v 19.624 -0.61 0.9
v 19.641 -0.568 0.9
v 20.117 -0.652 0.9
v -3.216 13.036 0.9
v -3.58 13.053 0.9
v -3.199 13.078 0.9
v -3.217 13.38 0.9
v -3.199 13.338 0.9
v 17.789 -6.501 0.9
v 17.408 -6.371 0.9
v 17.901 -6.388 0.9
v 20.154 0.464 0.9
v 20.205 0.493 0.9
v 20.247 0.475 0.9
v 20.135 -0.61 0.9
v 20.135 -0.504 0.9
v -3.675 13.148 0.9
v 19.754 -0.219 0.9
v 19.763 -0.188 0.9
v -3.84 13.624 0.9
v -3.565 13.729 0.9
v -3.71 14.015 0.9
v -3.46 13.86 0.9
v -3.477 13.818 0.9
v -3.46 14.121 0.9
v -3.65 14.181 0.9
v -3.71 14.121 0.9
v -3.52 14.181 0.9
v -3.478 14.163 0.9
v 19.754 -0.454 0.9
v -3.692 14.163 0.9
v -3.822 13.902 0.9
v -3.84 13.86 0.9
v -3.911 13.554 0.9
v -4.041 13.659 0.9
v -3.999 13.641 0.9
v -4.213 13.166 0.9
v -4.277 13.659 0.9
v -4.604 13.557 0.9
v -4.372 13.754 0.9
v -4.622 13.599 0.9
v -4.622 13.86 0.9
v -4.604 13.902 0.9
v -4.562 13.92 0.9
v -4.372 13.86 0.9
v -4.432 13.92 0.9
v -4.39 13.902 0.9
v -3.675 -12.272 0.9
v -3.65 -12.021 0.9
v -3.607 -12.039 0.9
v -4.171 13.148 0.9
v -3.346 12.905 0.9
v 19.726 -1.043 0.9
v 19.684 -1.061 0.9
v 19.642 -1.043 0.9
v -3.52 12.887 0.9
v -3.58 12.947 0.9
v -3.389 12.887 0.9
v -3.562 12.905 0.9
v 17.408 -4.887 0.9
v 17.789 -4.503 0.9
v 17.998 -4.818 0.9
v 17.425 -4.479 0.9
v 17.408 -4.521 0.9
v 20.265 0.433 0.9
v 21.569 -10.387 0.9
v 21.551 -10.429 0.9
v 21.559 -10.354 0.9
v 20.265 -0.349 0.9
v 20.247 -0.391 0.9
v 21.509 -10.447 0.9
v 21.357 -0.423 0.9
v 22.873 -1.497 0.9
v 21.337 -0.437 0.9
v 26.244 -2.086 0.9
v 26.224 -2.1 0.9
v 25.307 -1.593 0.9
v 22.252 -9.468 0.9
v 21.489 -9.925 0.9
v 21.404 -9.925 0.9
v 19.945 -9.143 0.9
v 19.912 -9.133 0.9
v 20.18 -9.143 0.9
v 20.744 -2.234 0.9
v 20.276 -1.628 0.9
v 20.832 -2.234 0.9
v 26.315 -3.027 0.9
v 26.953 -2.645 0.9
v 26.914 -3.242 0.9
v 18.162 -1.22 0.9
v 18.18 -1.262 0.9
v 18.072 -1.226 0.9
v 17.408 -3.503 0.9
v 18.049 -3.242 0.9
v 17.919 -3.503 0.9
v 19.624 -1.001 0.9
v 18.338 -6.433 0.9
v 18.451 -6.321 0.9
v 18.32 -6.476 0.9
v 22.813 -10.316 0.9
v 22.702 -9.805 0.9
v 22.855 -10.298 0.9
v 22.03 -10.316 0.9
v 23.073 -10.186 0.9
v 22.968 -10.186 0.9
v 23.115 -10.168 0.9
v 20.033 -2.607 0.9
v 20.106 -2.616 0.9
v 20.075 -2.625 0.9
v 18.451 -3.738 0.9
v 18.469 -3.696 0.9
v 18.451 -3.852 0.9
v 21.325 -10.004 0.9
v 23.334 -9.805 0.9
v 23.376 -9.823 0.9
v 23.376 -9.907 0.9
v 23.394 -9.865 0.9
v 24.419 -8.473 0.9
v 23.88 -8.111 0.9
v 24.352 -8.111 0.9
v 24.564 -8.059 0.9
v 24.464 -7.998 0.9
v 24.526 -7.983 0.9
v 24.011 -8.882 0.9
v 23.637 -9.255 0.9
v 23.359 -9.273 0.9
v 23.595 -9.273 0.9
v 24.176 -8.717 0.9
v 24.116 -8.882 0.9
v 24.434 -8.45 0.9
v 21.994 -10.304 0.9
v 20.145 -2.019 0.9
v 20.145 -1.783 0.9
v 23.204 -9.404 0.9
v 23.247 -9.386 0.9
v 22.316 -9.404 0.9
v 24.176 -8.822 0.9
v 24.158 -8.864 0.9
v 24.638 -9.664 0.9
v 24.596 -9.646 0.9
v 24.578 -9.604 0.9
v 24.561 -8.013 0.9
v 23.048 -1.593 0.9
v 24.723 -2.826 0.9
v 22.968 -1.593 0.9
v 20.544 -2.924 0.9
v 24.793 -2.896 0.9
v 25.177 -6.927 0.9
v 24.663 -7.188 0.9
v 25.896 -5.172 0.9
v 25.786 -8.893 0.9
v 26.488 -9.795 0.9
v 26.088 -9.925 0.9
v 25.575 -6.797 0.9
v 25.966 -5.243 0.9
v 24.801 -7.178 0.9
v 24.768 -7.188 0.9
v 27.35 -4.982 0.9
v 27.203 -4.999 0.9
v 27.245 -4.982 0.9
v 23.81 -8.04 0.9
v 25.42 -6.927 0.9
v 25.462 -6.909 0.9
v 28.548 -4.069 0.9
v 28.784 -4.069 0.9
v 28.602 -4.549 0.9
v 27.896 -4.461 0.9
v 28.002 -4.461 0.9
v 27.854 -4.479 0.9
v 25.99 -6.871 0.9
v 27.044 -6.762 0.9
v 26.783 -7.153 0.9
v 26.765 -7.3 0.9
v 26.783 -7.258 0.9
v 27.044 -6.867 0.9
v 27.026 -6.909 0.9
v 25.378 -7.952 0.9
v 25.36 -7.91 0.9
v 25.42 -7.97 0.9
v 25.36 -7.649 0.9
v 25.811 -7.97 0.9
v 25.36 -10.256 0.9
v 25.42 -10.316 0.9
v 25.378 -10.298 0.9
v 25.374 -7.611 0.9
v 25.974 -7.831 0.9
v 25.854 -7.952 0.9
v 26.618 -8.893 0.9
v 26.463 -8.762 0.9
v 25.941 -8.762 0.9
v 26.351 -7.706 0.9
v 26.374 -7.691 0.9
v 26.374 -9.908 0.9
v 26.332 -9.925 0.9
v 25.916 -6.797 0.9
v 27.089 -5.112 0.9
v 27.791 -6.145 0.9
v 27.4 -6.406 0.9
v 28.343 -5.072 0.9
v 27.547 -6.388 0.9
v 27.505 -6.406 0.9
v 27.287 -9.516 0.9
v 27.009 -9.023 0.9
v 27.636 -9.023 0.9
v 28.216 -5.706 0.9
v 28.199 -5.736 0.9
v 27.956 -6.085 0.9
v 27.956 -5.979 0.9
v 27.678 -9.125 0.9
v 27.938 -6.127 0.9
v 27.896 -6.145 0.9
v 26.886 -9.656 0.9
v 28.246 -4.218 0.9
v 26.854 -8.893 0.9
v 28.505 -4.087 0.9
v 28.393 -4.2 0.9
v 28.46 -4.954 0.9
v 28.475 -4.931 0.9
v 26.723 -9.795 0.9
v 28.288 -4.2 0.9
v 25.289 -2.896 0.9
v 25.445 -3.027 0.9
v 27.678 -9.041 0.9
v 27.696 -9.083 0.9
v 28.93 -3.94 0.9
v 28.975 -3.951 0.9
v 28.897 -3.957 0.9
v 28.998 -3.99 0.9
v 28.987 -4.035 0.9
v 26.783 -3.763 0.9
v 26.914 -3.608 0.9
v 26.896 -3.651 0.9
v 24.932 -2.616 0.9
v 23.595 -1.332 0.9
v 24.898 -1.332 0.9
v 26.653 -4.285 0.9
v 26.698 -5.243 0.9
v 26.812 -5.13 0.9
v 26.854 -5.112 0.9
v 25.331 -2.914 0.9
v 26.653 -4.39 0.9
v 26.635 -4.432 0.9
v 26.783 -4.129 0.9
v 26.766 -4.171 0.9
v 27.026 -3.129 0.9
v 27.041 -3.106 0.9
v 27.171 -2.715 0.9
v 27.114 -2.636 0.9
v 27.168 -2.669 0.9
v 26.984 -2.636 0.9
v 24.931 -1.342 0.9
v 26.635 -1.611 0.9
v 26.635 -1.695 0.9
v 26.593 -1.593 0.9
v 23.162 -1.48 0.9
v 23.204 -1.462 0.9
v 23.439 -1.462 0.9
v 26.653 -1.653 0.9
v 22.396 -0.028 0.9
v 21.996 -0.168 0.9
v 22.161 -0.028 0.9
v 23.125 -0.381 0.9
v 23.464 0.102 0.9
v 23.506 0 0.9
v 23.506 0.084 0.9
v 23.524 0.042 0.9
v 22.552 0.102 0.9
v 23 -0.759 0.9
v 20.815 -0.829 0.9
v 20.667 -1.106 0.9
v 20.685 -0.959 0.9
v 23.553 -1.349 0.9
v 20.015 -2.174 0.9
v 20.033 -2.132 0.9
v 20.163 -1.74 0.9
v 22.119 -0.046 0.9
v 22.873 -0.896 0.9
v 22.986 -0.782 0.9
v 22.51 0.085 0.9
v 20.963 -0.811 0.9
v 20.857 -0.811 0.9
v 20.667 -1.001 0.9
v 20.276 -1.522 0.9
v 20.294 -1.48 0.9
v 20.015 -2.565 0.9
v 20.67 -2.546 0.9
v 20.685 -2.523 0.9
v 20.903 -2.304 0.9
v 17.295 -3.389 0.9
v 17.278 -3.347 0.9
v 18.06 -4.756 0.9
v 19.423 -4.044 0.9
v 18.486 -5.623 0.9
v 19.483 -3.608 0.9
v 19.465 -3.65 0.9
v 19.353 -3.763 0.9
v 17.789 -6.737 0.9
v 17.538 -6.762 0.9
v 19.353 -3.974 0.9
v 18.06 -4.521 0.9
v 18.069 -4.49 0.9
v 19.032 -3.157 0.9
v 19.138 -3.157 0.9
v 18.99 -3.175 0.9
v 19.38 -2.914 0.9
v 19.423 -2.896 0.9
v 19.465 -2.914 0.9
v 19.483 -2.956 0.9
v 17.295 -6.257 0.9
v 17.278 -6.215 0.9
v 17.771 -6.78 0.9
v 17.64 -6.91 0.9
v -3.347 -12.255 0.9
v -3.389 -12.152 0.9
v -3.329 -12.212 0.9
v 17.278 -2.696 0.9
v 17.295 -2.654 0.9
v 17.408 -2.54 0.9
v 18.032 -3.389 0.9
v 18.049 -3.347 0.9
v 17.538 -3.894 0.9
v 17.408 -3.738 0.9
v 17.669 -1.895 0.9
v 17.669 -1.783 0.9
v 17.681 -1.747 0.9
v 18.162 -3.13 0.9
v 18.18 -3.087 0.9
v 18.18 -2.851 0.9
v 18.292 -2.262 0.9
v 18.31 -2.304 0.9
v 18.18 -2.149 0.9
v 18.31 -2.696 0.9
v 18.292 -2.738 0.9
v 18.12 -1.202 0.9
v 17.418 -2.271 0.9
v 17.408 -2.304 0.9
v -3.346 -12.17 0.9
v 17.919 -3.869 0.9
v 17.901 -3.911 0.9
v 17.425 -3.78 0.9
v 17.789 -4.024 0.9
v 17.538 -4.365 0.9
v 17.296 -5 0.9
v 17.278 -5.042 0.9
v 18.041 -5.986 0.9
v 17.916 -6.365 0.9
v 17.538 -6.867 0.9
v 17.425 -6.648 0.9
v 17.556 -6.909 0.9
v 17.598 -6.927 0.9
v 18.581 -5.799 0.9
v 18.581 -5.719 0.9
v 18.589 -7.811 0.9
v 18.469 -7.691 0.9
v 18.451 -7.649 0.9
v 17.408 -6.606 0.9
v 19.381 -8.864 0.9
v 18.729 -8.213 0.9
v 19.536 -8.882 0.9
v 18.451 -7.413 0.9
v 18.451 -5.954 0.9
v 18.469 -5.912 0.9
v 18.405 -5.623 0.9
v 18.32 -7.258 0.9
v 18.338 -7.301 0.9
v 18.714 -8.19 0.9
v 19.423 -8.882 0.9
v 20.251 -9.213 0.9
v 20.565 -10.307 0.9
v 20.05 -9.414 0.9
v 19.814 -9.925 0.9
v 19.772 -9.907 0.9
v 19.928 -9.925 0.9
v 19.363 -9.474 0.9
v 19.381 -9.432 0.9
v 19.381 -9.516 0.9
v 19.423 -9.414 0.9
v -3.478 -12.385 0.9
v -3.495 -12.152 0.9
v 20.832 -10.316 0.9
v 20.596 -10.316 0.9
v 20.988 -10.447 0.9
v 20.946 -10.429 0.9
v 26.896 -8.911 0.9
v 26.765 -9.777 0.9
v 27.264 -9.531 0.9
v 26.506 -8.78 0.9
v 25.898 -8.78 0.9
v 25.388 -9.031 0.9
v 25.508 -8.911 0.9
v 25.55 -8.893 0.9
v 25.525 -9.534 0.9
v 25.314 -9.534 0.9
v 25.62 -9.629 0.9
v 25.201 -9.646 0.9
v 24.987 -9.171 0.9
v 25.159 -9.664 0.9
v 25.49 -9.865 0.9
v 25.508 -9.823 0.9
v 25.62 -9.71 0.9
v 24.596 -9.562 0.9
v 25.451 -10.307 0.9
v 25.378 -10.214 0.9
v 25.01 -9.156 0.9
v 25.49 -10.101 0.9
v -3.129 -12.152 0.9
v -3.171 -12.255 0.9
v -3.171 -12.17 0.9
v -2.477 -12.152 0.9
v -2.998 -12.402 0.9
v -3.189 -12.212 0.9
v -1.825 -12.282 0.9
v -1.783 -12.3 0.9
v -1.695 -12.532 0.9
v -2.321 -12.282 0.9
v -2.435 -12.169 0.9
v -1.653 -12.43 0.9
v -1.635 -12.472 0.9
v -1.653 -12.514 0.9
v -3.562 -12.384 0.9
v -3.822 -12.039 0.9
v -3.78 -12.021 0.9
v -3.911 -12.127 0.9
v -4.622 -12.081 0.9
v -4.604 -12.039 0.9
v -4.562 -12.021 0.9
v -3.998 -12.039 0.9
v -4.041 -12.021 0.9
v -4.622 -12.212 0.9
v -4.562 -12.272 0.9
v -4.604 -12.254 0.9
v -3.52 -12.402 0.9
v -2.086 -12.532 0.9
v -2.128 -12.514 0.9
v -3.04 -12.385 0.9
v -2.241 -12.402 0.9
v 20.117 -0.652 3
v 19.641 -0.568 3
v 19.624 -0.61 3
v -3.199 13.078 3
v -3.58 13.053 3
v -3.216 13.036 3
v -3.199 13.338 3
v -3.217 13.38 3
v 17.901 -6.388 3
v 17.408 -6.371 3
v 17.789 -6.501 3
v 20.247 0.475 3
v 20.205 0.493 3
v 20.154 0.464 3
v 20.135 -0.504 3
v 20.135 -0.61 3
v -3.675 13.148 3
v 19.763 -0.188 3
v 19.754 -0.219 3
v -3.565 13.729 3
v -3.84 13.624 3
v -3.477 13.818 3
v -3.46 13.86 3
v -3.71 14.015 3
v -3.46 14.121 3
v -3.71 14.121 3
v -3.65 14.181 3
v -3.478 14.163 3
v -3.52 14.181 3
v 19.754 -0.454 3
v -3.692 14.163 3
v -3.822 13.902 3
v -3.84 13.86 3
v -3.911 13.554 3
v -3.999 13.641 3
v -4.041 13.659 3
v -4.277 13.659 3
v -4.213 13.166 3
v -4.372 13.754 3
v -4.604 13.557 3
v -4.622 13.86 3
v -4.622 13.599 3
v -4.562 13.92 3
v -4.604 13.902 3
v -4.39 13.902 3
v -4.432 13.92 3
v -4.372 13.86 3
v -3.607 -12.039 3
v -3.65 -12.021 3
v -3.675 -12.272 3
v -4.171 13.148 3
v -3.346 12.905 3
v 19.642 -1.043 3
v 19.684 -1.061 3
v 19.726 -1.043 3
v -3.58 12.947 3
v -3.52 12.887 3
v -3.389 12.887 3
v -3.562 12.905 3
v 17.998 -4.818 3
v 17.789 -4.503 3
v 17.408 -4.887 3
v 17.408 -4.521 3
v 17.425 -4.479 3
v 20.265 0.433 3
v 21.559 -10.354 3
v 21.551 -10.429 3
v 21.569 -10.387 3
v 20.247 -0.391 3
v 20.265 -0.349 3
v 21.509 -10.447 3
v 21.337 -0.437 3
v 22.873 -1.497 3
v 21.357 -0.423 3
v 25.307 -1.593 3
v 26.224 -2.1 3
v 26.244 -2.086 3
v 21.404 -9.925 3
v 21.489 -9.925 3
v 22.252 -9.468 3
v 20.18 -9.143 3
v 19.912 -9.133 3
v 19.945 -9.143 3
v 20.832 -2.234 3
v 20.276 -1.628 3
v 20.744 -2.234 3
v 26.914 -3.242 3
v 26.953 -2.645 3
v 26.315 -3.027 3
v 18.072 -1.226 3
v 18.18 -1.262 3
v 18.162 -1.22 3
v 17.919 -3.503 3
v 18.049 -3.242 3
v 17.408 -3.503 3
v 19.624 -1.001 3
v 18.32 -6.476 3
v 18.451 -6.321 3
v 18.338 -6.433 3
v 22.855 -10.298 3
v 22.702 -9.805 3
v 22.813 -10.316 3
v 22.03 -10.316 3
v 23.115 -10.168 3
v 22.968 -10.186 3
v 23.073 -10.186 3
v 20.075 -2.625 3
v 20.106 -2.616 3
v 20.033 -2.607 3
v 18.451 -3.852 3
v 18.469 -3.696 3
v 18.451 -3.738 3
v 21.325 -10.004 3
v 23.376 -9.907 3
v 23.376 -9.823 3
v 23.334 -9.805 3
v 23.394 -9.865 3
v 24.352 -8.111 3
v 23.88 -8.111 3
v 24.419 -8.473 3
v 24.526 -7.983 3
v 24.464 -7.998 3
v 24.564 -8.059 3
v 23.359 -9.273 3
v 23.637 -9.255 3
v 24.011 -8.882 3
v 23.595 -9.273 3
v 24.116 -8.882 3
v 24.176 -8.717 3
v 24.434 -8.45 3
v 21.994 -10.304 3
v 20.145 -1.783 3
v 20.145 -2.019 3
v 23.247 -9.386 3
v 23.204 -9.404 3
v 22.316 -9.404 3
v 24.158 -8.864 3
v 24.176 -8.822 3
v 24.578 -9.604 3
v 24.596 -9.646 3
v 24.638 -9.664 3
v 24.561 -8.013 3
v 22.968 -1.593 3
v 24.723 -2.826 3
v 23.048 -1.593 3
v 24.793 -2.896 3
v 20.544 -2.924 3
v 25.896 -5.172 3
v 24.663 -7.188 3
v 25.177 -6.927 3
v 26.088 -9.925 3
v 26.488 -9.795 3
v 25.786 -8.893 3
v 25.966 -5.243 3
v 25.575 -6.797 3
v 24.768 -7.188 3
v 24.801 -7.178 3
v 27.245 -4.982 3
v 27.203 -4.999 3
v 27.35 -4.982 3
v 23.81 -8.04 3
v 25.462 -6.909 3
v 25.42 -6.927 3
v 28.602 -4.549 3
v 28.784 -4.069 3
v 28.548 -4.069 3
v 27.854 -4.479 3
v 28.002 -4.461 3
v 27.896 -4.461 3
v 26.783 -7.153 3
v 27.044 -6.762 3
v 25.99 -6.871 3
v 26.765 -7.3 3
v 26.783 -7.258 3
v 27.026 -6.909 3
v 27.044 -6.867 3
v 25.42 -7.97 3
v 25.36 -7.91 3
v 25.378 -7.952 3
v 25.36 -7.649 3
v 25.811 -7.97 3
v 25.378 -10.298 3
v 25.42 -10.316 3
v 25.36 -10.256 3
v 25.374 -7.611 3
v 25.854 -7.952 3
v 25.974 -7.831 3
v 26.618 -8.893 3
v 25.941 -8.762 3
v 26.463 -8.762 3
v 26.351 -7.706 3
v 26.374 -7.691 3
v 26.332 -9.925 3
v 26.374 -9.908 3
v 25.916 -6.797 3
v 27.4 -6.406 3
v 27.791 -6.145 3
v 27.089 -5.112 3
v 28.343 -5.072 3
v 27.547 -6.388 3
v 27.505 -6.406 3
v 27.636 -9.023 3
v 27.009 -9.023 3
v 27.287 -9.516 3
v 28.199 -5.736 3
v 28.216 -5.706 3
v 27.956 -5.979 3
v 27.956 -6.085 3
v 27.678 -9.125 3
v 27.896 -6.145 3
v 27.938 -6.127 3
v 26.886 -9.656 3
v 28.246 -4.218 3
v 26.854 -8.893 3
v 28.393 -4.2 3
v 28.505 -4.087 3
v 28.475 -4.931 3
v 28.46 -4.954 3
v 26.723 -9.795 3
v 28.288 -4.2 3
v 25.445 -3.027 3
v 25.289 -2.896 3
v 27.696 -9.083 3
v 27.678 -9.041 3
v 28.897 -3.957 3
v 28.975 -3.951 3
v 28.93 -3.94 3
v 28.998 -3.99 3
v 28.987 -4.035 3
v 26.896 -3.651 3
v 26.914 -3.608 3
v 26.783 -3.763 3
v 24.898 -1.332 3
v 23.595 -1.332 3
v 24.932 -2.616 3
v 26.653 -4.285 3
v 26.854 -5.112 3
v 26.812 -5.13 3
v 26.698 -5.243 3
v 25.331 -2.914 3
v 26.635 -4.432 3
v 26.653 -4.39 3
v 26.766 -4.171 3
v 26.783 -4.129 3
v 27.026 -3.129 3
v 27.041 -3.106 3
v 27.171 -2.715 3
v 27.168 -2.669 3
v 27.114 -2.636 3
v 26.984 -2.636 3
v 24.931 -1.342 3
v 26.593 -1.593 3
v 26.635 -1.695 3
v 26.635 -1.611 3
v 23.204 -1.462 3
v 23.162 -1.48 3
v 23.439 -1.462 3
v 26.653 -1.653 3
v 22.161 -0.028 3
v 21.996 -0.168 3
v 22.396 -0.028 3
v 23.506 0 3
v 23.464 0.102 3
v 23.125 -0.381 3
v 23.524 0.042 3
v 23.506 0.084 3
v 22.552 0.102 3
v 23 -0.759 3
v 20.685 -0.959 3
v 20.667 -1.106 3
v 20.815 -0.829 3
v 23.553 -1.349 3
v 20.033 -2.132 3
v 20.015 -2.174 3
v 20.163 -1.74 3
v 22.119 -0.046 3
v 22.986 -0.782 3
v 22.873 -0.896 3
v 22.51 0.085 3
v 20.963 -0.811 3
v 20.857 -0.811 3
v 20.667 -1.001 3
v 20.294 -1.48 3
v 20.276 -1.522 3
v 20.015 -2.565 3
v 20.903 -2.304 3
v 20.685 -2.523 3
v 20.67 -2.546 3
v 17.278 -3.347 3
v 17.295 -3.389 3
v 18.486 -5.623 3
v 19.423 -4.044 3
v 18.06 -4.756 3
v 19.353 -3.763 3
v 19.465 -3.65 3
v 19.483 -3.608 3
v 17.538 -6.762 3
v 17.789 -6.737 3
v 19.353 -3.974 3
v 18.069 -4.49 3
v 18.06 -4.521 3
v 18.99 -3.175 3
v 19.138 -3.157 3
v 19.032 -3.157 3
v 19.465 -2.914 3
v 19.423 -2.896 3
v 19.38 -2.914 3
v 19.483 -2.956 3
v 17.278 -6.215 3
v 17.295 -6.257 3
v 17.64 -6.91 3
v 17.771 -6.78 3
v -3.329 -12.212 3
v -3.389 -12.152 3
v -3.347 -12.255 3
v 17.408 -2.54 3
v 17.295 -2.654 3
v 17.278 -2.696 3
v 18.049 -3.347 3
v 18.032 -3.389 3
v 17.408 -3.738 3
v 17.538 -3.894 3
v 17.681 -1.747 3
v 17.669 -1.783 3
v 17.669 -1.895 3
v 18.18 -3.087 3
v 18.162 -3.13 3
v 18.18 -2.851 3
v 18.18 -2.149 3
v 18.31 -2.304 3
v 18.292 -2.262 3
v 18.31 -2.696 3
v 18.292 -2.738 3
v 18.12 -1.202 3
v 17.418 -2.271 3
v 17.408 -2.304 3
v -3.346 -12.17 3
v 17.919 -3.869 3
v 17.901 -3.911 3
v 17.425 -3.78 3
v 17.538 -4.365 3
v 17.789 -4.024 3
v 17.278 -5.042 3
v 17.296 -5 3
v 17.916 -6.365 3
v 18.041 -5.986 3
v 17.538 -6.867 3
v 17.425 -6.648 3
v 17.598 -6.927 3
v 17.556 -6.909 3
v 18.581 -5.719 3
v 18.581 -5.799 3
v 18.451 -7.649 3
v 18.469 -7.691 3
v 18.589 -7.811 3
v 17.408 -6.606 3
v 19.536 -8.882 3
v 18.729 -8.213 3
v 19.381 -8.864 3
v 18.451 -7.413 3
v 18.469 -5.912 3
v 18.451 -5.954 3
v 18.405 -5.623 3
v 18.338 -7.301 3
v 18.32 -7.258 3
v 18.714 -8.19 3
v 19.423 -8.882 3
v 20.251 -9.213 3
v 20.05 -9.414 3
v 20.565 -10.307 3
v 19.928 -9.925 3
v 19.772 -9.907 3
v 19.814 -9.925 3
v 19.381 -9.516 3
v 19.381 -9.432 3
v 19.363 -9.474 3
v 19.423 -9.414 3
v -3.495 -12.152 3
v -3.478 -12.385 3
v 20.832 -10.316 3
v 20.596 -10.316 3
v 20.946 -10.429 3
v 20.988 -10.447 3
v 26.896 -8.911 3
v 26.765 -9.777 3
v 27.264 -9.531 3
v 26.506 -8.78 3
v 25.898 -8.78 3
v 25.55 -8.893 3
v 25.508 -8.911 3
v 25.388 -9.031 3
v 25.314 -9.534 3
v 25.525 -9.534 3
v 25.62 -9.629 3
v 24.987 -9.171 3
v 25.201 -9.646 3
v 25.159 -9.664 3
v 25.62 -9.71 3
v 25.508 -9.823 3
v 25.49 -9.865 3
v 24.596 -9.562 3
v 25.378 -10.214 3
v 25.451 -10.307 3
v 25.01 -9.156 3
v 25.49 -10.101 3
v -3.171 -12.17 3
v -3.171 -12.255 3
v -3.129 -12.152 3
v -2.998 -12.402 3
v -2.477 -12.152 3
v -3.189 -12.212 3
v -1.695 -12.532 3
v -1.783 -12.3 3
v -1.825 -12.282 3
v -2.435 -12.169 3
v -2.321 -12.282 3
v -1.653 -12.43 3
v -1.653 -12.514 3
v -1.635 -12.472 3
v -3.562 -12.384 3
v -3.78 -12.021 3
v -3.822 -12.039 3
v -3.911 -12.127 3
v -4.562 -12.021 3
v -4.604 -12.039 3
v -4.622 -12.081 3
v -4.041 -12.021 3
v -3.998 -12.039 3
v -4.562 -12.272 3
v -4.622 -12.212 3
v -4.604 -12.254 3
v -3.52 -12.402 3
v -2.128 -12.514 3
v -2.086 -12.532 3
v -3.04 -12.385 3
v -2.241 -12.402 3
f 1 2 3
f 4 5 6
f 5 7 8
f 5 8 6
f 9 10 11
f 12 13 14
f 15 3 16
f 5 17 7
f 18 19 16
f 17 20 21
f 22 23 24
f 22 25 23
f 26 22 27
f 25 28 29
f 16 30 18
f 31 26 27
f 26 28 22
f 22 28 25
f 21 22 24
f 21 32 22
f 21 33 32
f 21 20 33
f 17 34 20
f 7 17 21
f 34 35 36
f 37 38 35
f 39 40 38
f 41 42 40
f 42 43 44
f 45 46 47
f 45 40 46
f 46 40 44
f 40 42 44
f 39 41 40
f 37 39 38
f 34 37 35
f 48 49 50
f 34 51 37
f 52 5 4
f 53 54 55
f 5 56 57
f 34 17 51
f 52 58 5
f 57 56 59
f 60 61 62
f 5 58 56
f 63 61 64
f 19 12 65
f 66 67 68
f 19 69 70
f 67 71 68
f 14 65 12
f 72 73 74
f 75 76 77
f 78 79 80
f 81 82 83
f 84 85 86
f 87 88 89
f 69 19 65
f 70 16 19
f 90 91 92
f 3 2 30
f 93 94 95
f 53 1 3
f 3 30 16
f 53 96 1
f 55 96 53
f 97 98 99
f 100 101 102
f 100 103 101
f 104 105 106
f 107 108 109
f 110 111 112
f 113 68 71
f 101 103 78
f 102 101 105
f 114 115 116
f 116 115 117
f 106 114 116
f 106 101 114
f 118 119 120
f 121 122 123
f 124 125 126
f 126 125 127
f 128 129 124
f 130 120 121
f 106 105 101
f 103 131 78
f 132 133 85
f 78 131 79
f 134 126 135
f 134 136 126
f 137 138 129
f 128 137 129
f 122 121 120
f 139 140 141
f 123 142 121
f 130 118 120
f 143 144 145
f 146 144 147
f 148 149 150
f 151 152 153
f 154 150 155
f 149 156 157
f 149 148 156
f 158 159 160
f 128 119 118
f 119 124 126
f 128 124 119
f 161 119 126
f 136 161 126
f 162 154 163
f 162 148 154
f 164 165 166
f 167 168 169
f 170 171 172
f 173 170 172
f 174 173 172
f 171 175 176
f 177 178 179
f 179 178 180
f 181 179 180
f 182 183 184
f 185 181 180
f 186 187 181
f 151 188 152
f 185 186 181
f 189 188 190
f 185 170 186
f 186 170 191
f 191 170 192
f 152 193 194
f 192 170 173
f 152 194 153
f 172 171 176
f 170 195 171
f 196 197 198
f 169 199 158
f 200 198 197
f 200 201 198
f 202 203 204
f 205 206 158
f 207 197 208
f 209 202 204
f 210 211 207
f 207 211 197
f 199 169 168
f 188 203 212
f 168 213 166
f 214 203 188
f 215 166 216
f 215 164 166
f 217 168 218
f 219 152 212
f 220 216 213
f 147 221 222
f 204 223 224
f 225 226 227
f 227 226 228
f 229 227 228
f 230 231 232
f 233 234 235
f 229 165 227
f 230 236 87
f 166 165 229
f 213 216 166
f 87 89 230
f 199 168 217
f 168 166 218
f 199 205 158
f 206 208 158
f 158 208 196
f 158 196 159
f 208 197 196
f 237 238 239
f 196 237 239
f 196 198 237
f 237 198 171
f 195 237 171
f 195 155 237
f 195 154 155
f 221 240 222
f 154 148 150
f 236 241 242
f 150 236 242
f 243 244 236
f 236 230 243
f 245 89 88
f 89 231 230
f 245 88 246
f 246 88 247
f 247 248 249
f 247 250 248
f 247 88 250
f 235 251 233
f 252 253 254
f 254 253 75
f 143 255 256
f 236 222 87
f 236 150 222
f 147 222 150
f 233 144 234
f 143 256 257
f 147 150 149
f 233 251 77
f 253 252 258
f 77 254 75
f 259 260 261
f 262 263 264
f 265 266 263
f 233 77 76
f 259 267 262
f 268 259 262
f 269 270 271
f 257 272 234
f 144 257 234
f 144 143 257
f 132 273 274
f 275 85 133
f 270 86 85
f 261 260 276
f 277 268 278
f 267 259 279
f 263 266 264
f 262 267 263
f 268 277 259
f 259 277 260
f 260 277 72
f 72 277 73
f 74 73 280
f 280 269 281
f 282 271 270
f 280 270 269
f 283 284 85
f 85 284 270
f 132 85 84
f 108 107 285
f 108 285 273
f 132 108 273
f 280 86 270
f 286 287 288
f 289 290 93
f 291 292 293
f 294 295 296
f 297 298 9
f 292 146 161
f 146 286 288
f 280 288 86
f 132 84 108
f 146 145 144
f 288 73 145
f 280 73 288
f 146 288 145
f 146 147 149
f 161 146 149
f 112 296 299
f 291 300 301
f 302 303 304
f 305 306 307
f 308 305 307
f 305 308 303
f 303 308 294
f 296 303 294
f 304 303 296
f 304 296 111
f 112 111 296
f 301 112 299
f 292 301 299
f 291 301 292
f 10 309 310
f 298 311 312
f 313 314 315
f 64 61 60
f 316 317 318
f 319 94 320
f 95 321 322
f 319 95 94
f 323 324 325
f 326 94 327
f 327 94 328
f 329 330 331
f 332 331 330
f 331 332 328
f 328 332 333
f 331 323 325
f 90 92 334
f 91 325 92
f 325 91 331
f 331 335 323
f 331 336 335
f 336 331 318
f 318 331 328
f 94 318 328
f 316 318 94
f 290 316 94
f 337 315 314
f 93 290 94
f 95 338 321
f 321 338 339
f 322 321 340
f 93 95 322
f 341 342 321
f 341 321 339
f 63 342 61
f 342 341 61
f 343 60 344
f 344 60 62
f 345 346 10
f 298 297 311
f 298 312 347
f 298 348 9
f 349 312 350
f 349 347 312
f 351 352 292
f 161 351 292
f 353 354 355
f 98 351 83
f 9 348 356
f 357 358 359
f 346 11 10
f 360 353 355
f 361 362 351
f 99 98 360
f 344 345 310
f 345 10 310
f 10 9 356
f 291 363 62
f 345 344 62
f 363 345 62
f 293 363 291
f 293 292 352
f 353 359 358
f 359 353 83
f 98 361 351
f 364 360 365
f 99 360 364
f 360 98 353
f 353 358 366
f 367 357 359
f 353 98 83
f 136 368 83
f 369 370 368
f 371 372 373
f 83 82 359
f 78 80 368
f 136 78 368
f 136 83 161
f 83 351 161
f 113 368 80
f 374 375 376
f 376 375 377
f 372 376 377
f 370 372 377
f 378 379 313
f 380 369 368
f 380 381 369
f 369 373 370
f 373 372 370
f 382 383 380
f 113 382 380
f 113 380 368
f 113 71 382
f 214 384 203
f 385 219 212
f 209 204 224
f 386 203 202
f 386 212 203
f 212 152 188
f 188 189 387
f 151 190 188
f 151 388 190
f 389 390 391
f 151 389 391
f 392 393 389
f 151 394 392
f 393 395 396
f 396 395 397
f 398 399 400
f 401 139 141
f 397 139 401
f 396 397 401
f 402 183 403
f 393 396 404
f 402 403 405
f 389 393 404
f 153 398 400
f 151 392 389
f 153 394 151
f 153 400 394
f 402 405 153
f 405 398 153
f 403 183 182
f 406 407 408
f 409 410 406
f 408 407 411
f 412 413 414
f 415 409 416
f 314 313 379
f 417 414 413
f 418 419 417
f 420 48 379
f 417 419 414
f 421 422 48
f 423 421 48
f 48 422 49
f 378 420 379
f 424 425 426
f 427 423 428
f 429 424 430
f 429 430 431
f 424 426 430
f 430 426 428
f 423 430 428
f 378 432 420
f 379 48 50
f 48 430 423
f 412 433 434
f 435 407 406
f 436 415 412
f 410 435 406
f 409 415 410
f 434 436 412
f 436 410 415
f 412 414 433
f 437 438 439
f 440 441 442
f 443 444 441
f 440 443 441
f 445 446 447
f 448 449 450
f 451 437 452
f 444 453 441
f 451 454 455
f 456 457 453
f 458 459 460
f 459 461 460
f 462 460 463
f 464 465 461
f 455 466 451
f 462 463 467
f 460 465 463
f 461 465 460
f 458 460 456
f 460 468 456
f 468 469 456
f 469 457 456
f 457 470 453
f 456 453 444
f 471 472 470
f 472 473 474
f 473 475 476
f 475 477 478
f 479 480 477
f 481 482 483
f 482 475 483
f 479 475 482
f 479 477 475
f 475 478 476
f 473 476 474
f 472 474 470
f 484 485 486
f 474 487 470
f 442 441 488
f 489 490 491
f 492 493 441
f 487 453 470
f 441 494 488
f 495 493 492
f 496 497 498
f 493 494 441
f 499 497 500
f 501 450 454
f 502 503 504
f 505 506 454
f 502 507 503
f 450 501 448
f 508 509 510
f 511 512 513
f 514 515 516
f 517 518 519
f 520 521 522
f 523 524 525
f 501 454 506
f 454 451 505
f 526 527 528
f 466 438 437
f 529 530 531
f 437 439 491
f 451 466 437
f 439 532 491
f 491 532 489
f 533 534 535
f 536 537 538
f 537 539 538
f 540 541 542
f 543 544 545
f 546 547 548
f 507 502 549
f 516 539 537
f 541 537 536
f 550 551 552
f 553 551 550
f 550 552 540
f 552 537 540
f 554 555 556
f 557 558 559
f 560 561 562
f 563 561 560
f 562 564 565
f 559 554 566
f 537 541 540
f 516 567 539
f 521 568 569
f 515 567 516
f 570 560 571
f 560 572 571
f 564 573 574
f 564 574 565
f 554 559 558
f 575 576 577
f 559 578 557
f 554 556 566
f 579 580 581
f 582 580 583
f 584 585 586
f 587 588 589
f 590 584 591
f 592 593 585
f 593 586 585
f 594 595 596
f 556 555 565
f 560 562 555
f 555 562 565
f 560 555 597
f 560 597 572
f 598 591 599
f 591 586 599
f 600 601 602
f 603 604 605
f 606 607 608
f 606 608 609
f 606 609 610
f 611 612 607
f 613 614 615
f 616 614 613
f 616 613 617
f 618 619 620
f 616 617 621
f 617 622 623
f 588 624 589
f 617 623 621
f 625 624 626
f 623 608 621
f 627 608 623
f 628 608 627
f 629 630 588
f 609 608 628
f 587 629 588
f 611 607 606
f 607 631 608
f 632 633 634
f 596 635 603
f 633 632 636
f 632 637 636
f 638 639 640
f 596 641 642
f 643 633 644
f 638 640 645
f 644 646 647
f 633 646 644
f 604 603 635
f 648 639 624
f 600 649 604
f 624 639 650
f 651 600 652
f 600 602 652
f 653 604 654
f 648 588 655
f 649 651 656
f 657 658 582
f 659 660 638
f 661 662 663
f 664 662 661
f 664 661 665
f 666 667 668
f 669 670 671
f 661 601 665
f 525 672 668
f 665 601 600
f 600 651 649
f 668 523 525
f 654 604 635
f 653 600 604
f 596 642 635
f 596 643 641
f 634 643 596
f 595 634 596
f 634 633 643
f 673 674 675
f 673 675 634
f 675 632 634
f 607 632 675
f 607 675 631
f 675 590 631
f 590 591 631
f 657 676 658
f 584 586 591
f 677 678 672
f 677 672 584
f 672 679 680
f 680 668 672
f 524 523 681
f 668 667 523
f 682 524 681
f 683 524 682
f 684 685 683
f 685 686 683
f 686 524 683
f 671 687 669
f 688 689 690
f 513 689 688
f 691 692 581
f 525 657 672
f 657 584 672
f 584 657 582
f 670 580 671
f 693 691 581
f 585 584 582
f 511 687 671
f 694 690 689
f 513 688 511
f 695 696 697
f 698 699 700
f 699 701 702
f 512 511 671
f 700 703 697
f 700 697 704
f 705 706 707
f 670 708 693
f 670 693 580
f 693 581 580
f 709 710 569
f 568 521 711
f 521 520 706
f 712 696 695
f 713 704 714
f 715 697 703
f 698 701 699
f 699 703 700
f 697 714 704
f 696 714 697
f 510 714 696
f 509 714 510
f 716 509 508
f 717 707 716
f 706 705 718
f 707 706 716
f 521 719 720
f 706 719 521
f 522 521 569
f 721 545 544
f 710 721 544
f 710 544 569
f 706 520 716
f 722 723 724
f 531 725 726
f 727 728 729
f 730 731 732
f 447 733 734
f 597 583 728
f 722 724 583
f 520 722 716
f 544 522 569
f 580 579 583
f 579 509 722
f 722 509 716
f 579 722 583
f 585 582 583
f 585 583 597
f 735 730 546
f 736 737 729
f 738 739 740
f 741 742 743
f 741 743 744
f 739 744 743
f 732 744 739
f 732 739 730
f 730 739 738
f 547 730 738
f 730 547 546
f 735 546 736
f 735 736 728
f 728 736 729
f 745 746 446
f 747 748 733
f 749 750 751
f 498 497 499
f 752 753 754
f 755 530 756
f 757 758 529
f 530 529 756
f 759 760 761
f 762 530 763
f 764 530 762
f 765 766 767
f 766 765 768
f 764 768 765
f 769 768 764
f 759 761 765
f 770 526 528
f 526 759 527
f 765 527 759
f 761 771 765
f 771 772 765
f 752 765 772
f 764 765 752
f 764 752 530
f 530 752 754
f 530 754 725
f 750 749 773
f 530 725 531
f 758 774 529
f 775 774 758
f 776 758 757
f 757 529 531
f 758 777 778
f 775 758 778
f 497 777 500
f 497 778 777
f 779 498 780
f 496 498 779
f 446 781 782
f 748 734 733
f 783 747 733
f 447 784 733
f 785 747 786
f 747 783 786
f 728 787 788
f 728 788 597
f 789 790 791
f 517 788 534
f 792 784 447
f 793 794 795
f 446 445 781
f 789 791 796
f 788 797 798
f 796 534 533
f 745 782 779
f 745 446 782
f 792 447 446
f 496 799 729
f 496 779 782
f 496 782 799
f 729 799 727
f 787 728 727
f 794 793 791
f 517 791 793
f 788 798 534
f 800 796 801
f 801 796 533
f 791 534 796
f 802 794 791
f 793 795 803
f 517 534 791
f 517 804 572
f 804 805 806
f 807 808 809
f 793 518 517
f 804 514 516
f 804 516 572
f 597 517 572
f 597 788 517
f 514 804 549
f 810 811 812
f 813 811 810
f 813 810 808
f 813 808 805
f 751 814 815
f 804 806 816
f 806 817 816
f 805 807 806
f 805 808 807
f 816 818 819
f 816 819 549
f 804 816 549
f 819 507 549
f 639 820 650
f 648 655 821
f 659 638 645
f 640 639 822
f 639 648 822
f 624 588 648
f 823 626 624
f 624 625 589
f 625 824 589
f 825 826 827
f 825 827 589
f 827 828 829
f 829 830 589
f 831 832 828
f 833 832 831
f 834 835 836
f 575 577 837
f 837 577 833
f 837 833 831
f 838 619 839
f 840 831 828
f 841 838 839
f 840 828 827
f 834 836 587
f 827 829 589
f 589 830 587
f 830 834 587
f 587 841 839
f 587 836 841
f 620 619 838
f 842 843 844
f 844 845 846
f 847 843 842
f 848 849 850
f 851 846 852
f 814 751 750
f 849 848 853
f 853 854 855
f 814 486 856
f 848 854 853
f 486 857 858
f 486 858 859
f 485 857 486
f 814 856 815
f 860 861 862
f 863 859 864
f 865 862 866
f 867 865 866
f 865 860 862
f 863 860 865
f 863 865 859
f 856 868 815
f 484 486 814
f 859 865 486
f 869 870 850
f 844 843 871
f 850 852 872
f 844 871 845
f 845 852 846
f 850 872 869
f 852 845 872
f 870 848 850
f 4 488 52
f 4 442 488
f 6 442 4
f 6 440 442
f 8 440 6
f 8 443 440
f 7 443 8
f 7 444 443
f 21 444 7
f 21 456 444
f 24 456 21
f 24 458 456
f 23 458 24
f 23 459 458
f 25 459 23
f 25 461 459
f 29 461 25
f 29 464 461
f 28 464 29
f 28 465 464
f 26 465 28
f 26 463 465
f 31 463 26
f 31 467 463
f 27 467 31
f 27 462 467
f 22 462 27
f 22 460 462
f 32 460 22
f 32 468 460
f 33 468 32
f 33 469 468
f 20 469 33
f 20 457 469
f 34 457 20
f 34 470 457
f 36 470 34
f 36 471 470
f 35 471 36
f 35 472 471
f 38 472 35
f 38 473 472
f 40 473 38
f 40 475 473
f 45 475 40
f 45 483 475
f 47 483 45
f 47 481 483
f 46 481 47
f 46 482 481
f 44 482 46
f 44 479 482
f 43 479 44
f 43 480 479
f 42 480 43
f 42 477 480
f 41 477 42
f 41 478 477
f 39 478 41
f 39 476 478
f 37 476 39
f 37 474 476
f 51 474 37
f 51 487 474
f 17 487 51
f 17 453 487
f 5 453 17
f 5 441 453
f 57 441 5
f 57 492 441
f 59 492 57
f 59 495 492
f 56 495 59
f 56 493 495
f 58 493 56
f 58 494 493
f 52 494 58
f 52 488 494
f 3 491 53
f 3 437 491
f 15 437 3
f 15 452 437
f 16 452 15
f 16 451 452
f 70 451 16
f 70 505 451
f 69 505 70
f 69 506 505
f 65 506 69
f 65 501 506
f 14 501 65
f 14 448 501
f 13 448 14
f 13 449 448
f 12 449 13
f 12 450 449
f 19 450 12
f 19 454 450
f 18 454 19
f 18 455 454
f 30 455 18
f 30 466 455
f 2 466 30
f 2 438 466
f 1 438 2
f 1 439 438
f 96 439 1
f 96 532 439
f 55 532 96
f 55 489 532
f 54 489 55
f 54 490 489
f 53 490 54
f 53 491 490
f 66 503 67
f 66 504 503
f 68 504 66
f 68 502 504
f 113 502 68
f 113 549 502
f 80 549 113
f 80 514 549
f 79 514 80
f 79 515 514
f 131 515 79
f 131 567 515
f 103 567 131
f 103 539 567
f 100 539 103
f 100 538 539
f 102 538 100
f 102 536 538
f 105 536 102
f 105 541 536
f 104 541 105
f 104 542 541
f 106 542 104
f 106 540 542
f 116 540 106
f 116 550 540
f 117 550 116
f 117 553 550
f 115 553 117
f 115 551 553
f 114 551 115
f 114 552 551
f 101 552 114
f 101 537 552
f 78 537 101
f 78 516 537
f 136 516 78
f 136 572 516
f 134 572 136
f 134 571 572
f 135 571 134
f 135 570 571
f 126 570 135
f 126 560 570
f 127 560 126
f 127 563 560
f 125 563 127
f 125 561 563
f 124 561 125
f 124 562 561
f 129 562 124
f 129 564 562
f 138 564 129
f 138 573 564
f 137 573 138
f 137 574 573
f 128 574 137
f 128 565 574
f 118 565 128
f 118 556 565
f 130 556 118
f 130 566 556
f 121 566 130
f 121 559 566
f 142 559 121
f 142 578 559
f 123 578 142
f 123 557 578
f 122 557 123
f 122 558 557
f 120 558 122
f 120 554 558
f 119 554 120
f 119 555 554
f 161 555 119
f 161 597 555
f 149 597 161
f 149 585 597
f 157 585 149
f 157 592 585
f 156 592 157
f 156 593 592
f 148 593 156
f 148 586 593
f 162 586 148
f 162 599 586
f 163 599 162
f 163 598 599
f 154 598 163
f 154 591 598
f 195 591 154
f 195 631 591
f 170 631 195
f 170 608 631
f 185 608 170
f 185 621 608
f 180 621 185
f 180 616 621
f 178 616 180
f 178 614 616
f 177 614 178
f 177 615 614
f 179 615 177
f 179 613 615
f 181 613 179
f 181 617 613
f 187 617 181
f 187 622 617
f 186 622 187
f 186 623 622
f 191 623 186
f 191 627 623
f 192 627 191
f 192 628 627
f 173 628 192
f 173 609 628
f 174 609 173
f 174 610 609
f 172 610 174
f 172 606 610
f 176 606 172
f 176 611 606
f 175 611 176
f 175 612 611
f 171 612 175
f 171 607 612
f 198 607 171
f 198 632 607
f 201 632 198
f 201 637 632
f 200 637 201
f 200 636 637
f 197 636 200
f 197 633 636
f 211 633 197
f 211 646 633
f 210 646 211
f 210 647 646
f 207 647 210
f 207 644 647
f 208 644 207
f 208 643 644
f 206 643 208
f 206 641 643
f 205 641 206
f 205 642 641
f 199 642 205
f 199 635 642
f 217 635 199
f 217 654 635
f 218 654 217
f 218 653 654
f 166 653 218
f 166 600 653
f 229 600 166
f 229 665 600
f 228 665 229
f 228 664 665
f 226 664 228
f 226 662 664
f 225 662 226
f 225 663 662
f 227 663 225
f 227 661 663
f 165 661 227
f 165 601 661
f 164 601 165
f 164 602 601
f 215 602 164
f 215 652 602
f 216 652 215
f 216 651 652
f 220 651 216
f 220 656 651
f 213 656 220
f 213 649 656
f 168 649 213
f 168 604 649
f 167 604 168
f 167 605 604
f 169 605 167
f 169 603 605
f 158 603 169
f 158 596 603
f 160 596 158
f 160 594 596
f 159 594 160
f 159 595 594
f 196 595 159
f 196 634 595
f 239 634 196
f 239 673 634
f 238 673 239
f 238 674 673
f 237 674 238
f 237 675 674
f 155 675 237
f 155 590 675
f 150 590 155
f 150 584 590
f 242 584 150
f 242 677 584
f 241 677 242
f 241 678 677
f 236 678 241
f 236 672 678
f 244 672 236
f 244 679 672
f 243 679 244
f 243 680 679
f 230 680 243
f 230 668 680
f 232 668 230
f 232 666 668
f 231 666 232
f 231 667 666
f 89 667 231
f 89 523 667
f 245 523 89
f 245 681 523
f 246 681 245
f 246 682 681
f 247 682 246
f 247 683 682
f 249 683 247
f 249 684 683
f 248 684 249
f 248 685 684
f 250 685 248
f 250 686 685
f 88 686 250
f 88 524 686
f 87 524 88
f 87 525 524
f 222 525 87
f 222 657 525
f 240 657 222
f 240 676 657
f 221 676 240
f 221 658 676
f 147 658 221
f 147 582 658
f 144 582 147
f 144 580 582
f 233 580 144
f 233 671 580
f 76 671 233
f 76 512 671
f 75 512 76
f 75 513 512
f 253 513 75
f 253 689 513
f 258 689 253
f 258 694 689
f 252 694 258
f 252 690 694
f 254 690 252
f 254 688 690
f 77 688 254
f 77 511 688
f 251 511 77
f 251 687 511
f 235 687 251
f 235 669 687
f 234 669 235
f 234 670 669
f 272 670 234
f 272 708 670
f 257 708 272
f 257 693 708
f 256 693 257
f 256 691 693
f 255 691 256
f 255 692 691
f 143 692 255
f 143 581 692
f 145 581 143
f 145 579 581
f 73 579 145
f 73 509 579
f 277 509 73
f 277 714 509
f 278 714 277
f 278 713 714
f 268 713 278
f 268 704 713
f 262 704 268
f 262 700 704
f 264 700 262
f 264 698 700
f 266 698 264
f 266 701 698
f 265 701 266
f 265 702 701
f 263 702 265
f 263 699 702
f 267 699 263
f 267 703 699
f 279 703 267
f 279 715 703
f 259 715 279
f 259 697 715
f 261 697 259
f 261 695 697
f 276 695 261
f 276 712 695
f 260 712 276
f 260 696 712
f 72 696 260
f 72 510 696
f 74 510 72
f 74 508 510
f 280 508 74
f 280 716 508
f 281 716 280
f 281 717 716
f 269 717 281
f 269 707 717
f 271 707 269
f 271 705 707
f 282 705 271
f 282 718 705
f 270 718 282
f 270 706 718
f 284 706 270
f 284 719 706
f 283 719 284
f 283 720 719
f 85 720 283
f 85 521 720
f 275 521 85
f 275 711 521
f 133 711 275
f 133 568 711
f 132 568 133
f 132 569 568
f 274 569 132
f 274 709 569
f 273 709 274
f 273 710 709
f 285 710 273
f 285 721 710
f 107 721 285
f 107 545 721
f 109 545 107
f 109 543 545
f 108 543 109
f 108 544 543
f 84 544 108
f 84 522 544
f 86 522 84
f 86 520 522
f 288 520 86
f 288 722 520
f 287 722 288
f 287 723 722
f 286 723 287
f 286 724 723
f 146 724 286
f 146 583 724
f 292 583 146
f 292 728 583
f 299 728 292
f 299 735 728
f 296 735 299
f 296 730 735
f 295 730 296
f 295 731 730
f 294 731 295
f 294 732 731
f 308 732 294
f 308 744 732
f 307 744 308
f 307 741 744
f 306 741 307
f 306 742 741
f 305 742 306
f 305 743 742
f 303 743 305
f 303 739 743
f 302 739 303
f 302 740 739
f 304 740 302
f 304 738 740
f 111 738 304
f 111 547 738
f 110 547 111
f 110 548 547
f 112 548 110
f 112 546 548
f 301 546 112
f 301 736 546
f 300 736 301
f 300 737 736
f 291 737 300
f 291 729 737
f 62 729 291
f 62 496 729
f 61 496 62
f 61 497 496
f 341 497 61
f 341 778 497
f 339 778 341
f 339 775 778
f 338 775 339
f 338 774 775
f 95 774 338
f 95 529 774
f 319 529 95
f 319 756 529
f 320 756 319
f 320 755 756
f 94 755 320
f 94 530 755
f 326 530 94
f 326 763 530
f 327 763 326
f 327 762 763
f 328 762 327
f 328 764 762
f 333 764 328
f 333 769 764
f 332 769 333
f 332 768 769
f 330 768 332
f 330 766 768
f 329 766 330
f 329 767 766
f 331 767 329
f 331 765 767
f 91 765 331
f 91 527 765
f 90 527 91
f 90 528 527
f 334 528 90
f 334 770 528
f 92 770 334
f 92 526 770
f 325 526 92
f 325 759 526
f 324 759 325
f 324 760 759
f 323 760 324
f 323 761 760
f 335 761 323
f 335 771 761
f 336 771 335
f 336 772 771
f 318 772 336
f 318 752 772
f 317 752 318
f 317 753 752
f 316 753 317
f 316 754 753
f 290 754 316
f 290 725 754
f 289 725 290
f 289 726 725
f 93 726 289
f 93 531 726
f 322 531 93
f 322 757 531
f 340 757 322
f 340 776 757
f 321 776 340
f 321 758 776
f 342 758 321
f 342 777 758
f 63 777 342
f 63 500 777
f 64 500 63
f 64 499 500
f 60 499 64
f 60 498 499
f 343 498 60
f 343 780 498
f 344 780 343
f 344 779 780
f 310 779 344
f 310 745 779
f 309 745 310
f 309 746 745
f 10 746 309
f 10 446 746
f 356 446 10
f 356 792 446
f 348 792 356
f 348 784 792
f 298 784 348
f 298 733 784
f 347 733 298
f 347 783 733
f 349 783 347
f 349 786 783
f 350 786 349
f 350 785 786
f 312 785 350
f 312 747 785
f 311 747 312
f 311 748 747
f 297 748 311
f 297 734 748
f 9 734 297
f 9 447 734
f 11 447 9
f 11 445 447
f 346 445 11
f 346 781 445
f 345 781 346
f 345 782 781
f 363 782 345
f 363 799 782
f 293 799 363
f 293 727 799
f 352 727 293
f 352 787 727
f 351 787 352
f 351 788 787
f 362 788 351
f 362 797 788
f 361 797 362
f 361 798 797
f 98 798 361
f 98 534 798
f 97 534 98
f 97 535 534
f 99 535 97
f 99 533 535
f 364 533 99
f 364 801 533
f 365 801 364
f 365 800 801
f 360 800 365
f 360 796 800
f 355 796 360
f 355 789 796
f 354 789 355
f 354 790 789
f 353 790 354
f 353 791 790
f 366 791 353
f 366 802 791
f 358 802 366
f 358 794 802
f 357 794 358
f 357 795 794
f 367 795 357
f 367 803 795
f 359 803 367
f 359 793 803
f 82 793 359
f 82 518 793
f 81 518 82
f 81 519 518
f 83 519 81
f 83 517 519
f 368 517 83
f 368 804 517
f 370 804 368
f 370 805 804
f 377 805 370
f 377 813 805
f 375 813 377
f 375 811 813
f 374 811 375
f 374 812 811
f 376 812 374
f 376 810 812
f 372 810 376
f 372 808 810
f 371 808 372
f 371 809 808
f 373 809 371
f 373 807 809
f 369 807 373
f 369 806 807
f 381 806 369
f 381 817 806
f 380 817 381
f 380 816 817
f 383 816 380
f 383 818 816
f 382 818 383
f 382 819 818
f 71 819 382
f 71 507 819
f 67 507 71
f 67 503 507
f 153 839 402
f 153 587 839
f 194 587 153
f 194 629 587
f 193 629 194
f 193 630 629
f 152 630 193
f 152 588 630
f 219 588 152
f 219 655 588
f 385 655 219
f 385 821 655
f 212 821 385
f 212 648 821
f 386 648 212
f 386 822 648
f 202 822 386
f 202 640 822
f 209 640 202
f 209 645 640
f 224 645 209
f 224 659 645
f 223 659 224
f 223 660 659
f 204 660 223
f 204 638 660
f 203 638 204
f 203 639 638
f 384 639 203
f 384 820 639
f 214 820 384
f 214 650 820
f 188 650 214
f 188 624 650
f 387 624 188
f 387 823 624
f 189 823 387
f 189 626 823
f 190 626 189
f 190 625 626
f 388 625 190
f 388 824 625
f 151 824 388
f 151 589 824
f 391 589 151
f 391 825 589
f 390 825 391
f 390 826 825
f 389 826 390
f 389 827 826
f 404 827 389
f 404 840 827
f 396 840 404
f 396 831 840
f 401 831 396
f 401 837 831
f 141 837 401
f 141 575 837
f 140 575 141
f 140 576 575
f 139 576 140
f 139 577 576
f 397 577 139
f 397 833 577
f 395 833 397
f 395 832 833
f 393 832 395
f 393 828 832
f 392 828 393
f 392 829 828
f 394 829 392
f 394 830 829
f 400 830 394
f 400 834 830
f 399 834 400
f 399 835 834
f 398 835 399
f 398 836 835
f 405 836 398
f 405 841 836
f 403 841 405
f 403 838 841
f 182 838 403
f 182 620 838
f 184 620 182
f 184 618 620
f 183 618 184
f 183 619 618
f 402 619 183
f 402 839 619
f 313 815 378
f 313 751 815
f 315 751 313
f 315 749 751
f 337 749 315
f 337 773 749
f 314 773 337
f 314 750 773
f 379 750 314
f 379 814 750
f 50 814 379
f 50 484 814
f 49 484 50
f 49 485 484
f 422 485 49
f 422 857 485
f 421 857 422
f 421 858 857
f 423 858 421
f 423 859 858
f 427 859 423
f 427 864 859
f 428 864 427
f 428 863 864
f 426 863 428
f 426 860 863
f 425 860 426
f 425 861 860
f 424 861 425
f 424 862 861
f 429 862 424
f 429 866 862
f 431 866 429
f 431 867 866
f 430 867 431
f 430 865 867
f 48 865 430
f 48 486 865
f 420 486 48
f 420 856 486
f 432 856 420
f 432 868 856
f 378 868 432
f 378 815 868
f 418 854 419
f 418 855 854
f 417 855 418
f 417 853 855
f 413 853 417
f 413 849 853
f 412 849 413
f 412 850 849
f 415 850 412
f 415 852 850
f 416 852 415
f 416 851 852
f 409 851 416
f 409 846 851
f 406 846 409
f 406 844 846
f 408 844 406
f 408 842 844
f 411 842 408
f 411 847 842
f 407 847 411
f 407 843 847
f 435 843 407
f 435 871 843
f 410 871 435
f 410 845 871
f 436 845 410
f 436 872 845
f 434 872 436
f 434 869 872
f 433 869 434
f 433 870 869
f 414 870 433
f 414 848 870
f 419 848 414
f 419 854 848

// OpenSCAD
$fn = 24;
translate([0, -2.500, 0.900])
  linear_extrude(height=2.100) {
offset(r=0.06, $fn=8) {
    polygon(points=[[-4.562,-9.581],[-4.562,-9.712],[-3.650,-9.712],[-3.520,-9.842],[-3.389,-9.712],[-3.129,-9.712],[-2.998,-9.842],[-2.216,-9.842],[-2.086,-9.972],[-1.695,-9.972],[-1.825,-9.842],[-2.346,-9.842],[-2.477,-9.712],[-3.520,-9.712],[-3.650,-9.581],[-3.780,-9.581],[-3.911,-9.712],[-4.041,-9.581]], paths=[[0,1,2,3,4,5,6,7,8,9,10,11,12,13,14,15,16,17]]);
    polygon(points=[[24.638,-7.104],[25.159,-7.104],[25.289,-6.974],[25.550,-6.974],[25.680,-7.104],[25.680,-7.235],[25.550,-7.365],[25.550,-7.626],[25.420,-7.756],[26.071,-7.365],[26.332,-7.365],[26.463,-7.235],[26.723,-7.235],[26.854,-7.104],[27.245,-6.974],[27.636,-6.583],[26.984,-6.583],[26.854,-6.453],[26.593,-6.453],[26.463,-6.322],[25.941,-6.322],[25.811,-6.453],[25.550,-6.453],[25.420,-6.583],[25.029,-6.713]], paths=[[0,1,2,3,4,5,6,7,8,9,10,11,12,13,14,15,16,17,18,19,20,21,22,23,24]]);
    polygon(points=[[23.464,2.542],[22.552,2.542],[22.421,2.412],[22.161,2.412],[22.030,2.281],[21.379,2.021],[20.988,1.629],[20.857,1.629],[20.727,1.499],[20.727,1.369],[20.336,0.978],[20.336,0.847],[20.205,0.717],[20.205,0.456],[20.075,0.326],[20.075,-0.065],[20.727,0.326],[20.857,0.326],[20.988,0.196],[20.727,-0.065],[20.596,-0.456],[19.423,-1.629],[19.293,-1.499],[19.293,-1.238],[19.423,-1.108],[19.423,-0.456],[19.163,-0.717],[19.032,-0.717],[18.511,-1.238],[18.511,-1.369],[18.120,-2.021],[18.120,-2.281],[17.989,-2.412],[17.729,-2.021],[17.729,-1.499],[17.859,-1.369],[17.859,-0.978],[17.989,-0.847],[17.989,-0.717],[18.120,-0.587],[18.120,-0.326],[18.250,-0.196],[18.250,0.196],[18.120,0.326],[18.120,1.238],[17.729,0.717],[17.729,0.587],[17.468,0.196],[17.468,-0.065],[17.338,-0.196],[17.338,-0.847],[17.468,-0.978],[17.468,-1.238],[17.598,-1.369],[17.598,-1.890],[17.468,-2.021],[17.468,-2.412],[17.338,-2.542],[17.338,-3.715],[17.468,-3.846],[17.468,-4.106],[17.598,-4.237],[17.598,-4.367],[17.729,-4.237],[17.729,-3.976],[17.859,-3.846],[17.989,-3.454],[18.380,-3.063],[18.511,-3.063],[18.641,-3.194],[18.641,-3.324],[18.511,-3.454],[18.511,-3.846],[18.380,-3.976],[18.380,-4.758],[18.511,-4.888],[18.511,-5.149],[18.641,-5.279],[18.771,-5.671],[19.423,-6.322],[19.554,-6.322],[19.945,-6.583],[20.205,-6.583],[20.336,-6.713],[20.075,-6.974],[19.423,-6.974],[19.814,-7.365],[19.945,-7.365],[20.596,-7.756],[20.857,-7.756],[20.988,-7.887],[21.509,-7.887],[21.248,-7.496],[21.379,-7.365],[21.509,-7.365],[22.030,-7.756],[22.813,-7.756],[22.943,-7.626],[23.073,-7.626],[23.334,-7.365],[22.682,-7.365],[22.161,-6.974],[22.291,-6.844],[23.204,-6.844],[23.334,-6.713],[23.595,-6.713],[23.986,-6.322],[24.116,-6.322],[24.116,-6.192],[24.377,-5.931],[24.507,-5.540],[24.377,-5.671],[23.855,-5.671],[23.725,-5.540],[24.638,-4.628],[24.768,-4.628],[25.159,-4.367],[25.420,-4.367],[25.550,-4.237],[25.941,-4.237],[26.071,-4.367],[25.420,-5.149],[25.420,-5.410],[25.811,-5.410],[25.941,-5.279],[26.332,-5.149],[26.723,-4.758],[26.723,-4.628],[26.984,-4.367],[26.984,-4.237],[27.375,-3.846],[27.505,-3.846],[27.766,-3.585],[27.896,-3.585],[27.896,-3.454],[28.157,-3.194],[28.288,-2.542],[28.418,-2.412],[28.548,-2.021],[28.939,-1.499],[28.809,-1.629],[28.548,-1.629],[28.418,-1.760],[28.288,-1.760],[28.027,-2.021],[27.896,-2.021],[27.375,-2.542],[27.245,-2.542],[27.114,-2.672],[26.854,-2.672],[26.723,-2.803],[25.941,-2.803],[25.811,-2.672],[26.593,-1.890],[26.593,-1.760],[26.723,-1.629],[26.723,-1.238],[26.854,-1.108],[26.854,-0.717],[26.984,-0.587],[27.114,-0.196],[26.984,-0.196],[26.332,-0.587],[25.420,-0.587],[25.289,-0.456],[24.768,-0.456],[24.638,-0.326],[24.898,-0.065],[26.202,0.456],[26.593,0.847],[25.289,0.847],[24.898,1.108],[23.595,1.108],[23.464,0.978],[23.204,0.978],[23.073,0.847],[22.943,0.847],[22.813,0.978],[22.813,1.629],[22.943,1.760],[23.073,2.151]], paths=[[0,1,2,3,4,5,6,7,8,9,10,11,12,13,14,15,16,17,18,19,20,21,22,23,24,25,26,27,28,29,30,31,32,33,34,35,36,37,38,39,40,41,42,43,44,45,46,47,48,49,50,51,52,53,54,55,56,57,58,59,60,61,62,63,64,65,66,67,68,69,70,71,72,73,74,75,76,77,78,79,80,81,82,83,84,85,86,87,88,89,90,91,92,93,94,95,96,97,98,99,100,101,102,103,104,105,106,107,108,109,110,111,112,113,114,115,116,117,118,119,120,121,122,123,124,125,126,127,128,129,130,131,132,133,134,135,136,137,138,139,140,141,142,143,144,145,146,147,148,149,150,151,152,153,154,155,156,157,158,159,160,161,162,163,164,165,166,167,168,169,170,171,172,173,174,175,176,177,178,179,180]]);
    polygon(points=[[20.205,2.933],[19.814,2.281],[19.814,2.021],[19.684,1.890],[19.684,1.499],[19.554,1.369],[19.554,1.238],[19.554,1.369],[20.075,1.890],[20.075,2.021],[20.205,2.151]], paths=[[0,1,2,3,4,5,6,7,8,9,10]]);
    polygon(points=[[-4.562,16.360],[-4.562,16.099],[-4.171,15.708],[-3.650,15.708],[-3.520,15.578],[-3.520,15.447],[-3.389,15.447],[-3.259,15.578],[-3.259,15.838],[-3.650,16.229],[-3.520,16.360],[-3.520,16.621],[-3.650,16.621],[-3.650,16.490],[-3.780,16.360],[-3.780,16.099],[-3.911,15.969],[-4.041,16.099],[-4.302,16.099],[-4.432,16.229],[-4.432,16.360]], paths=[[0,1,2,3,4,5,6,7,8,9,10,11,12,13,14,15,16,17,18,19,20]]);
}
}
